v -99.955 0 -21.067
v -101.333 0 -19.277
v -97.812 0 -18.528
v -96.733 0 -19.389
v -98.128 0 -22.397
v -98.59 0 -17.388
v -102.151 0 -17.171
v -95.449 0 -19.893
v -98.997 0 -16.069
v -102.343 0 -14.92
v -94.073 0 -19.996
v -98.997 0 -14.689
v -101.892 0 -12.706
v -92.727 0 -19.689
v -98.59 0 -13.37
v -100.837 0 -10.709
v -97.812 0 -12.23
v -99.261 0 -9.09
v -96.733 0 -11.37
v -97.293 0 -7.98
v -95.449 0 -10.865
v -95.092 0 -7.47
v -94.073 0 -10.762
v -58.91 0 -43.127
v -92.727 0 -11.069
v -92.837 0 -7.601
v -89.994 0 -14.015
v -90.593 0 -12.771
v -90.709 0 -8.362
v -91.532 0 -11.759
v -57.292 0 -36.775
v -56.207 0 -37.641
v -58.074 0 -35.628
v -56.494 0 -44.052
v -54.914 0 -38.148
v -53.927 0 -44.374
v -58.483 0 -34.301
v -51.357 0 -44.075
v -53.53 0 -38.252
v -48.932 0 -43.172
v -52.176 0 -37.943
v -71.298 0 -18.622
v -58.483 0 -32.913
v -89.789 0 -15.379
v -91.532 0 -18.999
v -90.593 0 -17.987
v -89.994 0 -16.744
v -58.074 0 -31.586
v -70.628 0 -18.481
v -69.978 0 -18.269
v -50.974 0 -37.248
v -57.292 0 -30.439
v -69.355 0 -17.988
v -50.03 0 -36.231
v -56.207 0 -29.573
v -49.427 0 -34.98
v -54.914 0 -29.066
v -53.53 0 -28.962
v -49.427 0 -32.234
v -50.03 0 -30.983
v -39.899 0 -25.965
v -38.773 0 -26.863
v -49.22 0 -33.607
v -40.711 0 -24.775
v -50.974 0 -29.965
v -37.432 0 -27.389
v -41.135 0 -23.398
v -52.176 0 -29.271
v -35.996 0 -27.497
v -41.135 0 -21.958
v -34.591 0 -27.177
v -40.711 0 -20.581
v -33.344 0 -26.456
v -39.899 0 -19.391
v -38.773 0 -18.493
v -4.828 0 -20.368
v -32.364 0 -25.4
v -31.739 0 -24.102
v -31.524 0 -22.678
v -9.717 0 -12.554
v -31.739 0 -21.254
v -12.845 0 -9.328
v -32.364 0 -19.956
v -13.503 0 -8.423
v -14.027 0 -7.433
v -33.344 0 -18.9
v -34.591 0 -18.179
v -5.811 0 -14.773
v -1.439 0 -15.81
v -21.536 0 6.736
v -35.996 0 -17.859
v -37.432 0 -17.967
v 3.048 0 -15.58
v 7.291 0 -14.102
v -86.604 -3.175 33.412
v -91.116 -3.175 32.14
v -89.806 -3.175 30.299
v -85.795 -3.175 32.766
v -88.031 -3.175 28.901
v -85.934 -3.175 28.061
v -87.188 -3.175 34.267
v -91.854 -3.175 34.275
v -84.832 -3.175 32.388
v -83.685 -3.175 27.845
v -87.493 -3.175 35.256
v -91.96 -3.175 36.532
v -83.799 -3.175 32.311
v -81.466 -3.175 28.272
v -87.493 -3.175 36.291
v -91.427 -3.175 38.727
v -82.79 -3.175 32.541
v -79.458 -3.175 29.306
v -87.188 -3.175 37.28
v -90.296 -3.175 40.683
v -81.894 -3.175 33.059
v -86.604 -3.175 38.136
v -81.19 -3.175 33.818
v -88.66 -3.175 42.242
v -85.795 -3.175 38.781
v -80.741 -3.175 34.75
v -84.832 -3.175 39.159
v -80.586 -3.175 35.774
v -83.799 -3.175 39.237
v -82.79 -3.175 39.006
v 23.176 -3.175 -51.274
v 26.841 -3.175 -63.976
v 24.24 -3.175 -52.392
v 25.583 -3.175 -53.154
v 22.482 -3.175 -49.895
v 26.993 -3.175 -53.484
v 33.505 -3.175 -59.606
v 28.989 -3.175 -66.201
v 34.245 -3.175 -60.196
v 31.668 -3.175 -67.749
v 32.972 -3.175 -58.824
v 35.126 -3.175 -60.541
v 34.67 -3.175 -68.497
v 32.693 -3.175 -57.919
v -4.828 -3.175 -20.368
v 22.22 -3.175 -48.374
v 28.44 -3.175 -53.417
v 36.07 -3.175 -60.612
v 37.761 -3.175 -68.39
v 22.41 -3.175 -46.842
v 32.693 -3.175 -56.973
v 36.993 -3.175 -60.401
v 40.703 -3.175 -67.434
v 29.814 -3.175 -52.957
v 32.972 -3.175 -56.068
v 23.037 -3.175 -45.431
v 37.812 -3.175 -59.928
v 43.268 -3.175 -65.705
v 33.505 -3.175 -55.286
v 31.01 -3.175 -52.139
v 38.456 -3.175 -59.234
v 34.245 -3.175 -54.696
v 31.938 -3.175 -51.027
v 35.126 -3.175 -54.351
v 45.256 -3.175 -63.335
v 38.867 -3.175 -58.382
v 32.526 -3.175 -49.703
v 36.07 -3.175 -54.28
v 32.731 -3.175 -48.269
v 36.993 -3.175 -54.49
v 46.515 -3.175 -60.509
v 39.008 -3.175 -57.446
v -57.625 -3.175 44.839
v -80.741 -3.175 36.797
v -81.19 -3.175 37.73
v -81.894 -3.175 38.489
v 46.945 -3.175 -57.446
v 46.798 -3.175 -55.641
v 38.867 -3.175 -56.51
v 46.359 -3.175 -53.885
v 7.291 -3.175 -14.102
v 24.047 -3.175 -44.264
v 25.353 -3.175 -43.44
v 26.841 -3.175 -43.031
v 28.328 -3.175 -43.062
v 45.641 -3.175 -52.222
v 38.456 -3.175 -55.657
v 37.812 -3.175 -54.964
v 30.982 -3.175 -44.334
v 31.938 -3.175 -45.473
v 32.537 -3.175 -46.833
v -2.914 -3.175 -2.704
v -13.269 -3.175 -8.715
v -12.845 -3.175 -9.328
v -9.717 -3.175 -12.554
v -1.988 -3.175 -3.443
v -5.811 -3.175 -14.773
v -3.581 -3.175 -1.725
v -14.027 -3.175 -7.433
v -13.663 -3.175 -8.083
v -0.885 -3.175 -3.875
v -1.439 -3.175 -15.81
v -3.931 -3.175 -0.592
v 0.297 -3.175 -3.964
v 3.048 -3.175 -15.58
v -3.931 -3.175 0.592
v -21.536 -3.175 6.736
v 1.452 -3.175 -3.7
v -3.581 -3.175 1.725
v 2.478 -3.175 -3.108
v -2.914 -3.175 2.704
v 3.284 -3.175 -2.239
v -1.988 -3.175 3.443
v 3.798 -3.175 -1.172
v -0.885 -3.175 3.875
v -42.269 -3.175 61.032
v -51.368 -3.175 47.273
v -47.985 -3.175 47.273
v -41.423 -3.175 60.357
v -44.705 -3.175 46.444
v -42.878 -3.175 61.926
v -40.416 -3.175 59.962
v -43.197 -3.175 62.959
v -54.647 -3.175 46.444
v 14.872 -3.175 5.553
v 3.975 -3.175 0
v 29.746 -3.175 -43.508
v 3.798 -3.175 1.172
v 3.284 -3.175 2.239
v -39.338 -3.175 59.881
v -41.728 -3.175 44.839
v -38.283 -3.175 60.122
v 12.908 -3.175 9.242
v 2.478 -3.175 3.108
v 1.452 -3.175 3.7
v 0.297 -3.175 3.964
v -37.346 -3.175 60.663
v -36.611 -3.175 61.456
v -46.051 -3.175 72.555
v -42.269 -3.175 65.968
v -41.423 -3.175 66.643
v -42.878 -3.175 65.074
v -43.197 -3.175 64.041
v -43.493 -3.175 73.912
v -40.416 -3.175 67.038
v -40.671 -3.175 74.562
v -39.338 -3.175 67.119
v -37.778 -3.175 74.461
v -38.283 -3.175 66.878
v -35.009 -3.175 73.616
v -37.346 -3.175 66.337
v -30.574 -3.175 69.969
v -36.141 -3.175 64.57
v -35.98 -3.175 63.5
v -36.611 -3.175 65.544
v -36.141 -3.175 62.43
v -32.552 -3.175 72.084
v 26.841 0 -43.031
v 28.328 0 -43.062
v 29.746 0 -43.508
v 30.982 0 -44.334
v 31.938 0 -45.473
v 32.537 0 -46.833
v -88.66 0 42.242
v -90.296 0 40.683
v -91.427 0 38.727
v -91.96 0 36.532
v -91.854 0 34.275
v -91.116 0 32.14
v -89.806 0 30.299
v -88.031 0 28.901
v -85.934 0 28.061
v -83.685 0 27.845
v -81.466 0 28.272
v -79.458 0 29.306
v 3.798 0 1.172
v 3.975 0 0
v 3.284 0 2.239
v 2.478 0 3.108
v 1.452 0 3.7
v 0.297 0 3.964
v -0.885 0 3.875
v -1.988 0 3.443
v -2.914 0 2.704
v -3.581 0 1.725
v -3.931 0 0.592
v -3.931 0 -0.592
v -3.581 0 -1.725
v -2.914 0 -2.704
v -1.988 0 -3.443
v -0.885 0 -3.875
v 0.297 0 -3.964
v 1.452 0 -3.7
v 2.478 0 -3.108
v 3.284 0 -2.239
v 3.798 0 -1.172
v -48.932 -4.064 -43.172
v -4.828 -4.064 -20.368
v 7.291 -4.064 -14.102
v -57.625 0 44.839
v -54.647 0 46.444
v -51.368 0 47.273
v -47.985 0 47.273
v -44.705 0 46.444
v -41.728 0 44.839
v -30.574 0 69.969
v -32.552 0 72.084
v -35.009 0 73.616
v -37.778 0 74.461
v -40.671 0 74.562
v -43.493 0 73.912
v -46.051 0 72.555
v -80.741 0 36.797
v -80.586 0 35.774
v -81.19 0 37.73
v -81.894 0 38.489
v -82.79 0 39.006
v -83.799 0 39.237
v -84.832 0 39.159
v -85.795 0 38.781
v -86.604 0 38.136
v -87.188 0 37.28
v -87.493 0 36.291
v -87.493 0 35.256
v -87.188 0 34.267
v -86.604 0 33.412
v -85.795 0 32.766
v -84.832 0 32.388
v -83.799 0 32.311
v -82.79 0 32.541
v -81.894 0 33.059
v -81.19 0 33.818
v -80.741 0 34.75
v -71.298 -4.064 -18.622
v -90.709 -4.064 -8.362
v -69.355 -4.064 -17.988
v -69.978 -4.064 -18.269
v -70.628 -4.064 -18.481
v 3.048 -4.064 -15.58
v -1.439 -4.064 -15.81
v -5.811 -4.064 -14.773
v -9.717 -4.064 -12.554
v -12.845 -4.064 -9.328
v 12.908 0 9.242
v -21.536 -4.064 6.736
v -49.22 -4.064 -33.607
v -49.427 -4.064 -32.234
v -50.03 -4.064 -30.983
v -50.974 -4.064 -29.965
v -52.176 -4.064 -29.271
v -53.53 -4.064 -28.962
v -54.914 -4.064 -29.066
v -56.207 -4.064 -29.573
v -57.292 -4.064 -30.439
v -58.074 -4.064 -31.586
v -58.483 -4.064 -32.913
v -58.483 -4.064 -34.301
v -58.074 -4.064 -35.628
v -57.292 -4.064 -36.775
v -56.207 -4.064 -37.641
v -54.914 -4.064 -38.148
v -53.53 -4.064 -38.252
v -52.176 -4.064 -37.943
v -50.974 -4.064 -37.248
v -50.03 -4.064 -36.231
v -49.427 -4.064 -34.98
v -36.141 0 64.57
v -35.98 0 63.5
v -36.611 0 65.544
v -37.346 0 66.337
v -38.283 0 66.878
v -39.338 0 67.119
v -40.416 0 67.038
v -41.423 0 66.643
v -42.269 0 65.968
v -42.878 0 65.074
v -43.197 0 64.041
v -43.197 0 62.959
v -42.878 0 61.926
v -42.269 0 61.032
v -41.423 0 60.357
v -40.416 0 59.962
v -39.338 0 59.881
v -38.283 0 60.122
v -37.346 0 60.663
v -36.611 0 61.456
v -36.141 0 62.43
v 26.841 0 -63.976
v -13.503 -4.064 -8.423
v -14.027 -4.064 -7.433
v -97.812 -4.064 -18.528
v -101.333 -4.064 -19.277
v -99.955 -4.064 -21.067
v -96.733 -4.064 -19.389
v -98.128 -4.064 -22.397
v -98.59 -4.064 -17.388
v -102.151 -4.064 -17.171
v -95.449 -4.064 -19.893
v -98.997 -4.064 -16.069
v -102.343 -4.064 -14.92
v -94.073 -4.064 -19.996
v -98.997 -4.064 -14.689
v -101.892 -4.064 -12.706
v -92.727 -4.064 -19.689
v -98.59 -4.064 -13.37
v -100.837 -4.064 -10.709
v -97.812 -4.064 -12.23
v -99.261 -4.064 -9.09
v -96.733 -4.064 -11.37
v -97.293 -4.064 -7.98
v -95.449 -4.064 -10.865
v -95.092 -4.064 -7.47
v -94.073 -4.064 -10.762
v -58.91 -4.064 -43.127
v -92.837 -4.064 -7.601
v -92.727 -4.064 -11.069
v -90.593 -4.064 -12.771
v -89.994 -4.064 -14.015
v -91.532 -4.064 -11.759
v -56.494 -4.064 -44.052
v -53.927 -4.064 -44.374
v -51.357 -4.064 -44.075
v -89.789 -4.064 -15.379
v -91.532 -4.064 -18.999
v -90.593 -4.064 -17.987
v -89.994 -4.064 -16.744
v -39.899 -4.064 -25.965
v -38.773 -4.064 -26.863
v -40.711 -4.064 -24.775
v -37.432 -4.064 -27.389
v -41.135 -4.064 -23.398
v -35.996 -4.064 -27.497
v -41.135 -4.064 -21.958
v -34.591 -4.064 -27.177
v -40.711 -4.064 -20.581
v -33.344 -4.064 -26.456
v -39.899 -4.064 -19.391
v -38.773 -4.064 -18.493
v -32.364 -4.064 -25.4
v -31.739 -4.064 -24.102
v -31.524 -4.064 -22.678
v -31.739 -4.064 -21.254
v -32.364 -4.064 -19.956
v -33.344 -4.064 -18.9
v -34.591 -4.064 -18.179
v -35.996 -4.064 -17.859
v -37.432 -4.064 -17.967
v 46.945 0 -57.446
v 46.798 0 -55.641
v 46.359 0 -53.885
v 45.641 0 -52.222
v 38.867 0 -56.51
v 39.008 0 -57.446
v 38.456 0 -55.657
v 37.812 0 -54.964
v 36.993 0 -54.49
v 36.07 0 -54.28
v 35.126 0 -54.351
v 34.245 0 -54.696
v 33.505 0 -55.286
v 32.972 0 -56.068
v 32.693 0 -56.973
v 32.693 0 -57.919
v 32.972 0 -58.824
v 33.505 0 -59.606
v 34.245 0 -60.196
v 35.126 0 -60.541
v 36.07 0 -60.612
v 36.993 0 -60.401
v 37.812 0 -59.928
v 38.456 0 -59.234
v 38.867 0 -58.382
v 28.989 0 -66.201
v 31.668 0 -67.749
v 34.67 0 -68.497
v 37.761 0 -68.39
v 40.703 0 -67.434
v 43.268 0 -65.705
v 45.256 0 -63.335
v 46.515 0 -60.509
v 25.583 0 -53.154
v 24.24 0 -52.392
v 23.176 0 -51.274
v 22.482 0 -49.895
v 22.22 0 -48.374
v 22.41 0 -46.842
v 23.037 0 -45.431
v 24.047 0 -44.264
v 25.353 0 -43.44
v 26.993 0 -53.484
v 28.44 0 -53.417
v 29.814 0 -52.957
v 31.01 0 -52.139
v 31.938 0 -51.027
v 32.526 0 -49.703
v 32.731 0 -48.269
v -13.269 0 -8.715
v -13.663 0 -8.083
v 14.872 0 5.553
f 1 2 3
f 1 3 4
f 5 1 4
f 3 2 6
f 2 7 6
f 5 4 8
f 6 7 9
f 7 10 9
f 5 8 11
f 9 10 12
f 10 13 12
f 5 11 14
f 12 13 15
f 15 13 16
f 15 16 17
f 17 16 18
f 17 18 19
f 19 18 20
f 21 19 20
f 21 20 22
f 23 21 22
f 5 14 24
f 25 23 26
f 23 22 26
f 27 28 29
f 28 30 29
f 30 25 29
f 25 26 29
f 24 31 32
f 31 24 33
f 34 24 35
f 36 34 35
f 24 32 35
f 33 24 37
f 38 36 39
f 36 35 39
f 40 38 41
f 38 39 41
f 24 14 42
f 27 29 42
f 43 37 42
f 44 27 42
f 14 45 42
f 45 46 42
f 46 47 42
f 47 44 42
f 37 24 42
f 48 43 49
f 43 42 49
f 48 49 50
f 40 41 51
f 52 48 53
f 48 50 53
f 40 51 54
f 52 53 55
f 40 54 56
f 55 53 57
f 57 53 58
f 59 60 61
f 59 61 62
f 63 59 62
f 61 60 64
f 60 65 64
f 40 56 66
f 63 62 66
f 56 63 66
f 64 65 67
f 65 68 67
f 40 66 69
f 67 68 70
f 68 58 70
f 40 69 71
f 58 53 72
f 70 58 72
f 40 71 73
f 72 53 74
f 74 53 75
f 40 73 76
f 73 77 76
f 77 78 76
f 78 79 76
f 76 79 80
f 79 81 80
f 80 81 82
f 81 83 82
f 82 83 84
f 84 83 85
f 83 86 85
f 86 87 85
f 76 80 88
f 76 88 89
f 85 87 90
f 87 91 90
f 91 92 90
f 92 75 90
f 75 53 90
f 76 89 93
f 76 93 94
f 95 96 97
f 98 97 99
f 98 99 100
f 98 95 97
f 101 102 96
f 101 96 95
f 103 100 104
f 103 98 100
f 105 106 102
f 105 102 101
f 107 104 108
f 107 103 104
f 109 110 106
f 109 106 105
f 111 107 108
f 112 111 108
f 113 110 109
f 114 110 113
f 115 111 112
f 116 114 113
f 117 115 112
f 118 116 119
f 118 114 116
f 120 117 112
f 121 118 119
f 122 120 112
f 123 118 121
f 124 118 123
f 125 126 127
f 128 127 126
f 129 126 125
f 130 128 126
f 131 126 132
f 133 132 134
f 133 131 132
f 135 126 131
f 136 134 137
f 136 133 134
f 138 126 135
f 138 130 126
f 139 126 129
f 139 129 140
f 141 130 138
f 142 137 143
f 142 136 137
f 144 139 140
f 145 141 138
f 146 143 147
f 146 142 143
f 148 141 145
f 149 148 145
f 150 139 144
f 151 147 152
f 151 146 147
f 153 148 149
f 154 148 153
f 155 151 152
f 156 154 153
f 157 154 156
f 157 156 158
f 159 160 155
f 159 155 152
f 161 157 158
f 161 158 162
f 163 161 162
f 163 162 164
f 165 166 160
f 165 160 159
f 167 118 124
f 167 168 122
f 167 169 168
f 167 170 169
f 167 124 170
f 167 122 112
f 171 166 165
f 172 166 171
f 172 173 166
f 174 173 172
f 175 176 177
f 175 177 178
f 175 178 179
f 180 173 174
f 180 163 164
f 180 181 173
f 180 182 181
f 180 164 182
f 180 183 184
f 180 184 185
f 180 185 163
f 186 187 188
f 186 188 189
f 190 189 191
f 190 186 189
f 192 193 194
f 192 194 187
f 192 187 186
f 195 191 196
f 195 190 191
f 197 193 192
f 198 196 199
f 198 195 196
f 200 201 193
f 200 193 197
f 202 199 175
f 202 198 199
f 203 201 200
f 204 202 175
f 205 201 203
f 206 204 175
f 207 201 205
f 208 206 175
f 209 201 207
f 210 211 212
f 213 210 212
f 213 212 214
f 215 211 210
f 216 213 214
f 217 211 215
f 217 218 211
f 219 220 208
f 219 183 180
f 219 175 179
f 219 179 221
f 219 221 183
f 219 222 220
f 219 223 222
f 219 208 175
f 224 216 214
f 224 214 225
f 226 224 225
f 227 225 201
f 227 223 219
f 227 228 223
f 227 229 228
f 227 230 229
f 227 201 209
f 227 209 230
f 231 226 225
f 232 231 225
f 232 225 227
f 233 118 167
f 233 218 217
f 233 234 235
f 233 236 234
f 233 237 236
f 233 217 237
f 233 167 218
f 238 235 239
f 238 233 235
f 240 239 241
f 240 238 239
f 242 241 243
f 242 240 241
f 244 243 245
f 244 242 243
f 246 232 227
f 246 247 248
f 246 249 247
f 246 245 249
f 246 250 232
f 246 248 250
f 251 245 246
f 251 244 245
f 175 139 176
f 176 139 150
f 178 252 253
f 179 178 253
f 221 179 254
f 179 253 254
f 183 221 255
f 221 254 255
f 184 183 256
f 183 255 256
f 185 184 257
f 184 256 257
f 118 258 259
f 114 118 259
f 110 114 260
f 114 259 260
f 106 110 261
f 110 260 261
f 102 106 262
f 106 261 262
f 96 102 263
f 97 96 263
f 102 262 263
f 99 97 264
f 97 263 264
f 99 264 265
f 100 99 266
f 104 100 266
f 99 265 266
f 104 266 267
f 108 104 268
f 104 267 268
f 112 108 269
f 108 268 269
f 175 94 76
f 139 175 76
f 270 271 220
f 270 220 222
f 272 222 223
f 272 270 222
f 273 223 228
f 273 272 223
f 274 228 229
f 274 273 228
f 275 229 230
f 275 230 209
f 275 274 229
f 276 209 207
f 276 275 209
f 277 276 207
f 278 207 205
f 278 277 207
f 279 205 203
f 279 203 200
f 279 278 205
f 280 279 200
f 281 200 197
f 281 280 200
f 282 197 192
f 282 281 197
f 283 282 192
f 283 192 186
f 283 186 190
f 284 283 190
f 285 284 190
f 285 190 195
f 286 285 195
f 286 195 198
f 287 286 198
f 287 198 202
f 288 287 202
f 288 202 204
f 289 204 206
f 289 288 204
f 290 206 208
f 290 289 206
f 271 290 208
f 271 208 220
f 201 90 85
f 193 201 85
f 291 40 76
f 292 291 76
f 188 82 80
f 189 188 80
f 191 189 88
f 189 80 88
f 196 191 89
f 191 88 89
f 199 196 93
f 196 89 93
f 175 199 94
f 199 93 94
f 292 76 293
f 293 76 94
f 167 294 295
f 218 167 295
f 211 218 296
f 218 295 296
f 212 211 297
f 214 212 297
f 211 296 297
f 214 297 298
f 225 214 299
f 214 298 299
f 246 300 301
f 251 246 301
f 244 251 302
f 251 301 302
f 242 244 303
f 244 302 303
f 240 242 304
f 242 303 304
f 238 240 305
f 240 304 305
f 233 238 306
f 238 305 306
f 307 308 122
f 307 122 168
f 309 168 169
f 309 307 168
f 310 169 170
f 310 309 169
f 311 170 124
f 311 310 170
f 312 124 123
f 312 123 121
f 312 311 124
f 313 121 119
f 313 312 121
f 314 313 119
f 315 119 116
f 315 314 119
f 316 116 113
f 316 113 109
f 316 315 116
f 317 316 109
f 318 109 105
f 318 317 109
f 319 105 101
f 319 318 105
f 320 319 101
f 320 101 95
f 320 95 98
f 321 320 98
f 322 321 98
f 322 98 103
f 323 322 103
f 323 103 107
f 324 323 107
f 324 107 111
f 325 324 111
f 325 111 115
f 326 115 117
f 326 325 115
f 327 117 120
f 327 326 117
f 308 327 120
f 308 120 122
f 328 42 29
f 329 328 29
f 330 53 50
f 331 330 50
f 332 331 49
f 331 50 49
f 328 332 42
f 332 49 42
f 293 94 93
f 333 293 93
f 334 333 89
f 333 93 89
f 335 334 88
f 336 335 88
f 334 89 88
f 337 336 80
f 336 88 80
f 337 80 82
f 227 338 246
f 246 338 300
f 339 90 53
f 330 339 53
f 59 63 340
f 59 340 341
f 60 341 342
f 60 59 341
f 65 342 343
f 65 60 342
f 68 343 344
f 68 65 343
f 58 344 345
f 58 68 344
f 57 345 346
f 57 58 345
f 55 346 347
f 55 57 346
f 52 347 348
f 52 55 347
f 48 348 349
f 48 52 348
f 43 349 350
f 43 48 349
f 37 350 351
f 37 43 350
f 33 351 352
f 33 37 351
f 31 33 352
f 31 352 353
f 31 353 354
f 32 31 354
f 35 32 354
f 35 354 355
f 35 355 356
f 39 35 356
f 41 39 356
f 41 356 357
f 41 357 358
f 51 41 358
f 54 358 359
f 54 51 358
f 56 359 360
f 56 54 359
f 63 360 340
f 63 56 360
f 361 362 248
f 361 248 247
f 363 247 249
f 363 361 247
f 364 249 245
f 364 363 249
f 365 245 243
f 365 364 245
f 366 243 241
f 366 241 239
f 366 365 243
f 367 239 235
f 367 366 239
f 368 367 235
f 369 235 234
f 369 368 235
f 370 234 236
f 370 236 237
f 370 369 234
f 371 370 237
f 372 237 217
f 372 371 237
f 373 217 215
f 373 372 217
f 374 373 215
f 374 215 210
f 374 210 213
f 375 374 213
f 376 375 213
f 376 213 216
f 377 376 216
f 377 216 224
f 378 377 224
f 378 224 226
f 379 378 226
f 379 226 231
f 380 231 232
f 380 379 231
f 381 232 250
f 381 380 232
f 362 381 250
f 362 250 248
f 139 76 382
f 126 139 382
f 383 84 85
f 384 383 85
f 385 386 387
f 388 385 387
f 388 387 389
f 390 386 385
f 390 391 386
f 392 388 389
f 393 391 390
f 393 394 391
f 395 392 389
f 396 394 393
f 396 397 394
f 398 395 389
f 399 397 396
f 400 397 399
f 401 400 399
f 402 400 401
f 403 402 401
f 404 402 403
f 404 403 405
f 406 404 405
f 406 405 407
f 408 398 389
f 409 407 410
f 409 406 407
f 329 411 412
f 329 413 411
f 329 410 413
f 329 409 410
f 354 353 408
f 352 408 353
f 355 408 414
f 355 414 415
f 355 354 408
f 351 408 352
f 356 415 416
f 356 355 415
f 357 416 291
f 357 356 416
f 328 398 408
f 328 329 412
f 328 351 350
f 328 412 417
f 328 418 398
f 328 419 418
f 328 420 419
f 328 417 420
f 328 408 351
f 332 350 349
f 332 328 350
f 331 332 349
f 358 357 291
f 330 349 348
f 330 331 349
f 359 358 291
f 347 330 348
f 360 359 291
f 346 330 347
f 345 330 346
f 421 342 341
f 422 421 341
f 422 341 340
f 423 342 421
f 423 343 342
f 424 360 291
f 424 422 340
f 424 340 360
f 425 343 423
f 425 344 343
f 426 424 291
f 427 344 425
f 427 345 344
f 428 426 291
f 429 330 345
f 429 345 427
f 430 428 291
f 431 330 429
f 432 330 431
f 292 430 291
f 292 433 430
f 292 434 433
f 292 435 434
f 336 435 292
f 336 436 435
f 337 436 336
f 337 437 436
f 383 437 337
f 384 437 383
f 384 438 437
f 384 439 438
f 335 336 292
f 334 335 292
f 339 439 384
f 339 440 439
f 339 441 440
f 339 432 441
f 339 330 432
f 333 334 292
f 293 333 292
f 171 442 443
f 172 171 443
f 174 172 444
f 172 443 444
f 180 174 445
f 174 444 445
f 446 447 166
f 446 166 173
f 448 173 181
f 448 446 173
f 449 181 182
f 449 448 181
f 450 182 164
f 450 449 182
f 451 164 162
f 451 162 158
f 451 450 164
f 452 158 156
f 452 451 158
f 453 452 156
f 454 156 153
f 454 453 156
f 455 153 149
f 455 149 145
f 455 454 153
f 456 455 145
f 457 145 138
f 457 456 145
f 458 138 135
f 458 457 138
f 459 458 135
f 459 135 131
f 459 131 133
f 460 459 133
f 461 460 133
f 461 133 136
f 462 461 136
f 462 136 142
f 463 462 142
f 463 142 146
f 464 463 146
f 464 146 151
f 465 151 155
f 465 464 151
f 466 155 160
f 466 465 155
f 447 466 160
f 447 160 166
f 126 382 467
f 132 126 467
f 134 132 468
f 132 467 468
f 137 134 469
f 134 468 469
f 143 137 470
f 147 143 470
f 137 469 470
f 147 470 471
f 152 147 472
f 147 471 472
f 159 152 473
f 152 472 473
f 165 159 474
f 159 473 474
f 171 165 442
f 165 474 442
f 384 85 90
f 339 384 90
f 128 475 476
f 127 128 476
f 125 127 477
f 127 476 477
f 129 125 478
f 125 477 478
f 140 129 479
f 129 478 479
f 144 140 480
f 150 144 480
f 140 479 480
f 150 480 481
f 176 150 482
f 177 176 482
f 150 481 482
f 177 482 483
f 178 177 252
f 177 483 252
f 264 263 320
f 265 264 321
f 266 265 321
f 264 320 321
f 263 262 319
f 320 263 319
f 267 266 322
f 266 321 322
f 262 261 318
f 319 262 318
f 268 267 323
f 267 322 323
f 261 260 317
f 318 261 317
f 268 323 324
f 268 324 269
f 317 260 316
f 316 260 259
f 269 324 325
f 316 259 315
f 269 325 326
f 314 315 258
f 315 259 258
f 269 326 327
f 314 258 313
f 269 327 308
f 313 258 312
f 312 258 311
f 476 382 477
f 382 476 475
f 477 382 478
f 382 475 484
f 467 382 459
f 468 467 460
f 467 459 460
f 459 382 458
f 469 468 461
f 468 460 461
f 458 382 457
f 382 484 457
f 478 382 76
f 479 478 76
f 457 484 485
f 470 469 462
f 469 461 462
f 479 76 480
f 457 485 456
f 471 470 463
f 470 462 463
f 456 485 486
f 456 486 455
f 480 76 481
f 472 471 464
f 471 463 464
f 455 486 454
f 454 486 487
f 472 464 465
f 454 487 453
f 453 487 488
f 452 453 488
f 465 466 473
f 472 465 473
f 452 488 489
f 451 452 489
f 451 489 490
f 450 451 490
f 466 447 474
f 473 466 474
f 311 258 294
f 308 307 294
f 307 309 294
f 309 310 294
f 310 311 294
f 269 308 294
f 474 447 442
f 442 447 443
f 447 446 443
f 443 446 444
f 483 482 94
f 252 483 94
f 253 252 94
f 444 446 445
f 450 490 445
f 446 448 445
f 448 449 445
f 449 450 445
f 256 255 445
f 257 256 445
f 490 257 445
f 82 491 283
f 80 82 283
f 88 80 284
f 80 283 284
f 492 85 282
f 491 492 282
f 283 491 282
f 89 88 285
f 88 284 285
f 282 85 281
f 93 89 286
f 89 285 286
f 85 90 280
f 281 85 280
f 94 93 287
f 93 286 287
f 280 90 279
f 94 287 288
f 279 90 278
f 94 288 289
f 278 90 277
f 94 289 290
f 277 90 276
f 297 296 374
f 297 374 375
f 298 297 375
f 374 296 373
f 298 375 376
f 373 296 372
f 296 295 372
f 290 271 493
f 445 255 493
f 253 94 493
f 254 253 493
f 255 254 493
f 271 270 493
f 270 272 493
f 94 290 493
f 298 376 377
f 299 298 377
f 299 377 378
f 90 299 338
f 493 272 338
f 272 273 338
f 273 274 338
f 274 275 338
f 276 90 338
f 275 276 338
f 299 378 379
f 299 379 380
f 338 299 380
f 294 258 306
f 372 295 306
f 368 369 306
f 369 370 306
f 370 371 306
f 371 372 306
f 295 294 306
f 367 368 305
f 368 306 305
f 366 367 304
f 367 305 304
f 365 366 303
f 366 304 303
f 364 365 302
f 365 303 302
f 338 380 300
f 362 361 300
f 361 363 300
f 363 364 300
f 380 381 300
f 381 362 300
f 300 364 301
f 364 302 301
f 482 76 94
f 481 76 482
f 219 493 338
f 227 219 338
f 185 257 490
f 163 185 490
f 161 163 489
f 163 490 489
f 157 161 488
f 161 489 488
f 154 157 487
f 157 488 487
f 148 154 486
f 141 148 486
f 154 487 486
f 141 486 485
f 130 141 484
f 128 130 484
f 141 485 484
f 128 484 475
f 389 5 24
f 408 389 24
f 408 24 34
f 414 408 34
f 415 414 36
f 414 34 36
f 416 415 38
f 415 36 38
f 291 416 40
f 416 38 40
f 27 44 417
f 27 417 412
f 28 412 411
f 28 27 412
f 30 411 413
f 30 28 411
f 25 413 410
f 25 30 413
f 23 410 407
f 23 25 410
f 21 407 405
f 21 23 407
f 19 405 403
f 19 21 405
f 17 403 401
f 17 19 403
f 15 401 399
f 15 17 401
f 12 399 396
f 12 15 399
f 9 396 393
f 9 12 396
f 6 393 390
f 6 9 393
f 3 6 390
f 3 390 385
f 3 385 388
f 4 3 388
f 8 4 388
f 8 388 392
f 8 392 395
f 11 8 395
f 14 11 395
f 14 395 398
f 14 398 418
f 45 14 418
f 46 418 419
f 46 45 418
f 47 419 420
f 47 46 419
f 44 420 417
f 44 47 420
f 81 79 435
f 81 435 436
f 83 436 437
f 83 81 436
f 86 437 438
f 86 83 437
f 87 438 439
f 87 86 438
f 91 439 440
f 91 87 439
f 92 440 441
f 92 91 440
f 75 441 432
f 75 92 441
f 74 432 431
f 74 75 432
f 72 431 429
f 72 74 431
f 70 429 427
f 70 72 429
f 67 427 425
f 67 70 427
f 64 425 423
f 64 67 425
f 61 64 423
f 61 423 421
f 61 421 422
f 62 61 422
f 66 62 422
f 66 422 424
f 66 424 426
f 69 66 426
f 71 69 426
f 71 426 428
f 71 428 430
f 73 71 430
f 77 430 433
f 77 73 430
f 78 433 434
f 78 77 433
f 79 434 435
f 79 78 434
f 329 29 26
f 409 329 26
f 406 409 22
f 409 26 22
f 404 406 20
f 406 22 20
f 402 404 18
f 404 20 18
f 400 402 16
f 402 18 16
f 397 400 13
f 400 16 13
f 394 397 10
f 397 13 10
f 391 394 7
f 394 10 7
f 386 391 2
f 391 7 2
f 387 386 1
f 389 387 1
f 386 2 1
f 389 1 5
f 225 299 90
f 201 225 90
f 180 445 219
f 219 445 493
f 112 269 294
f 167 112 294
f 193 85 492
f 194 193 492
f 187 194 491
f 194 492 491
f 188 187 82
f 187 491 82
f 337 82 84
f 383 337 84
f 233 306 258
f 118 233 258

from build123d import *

# Parameters (mm, degrees)
F0_R     = 3.9751
F0_R_2   = 3.628816
F0_R_3   = 3.472518
F0_R_4   = 3.175
F1_DEPTH = 3.175
F0_R_5   = 4.832637
F0_R_6   = 4.629733
F0_R_7   = 4.657638
F2_DEPTH = 4.064


with BuildPart() as f1:
    # F0 (on Front) → F1 (new body)
    with BuildSketch(Plane.XZ):
        with BuildLine():
            Line((-21.536162, 6.73628), (-14.027085, -7.433472))
            ThreePointArc((-14.027085, -7.433472), (-8.356432, 13.497617), (12.907511, 9.241849))
            Line((12.907511, 9.241849), (-30.573676, 69.969295))
            ThreePointArc((-30.573676, 69.969295), (-29.028481, 66.897304), (-28.496434, 63.5))
            ThreePointArc((-28.496434, 63.5), (-44.703185, 53.623955), (-46.050767, 72.554858))
            Line((-46.050767, 72.554858), (-88.660243, 42.241502))
            ThreePointArc((-88.660243, 42.241502), (-80.420183, 42.828064), (-76.121434, 35.773746))
            ThreePointArc((-76.121434, 35.773746), (-77.004616, 32.134995), (-79.457625, 29.305991))
            Line((-79.457625, 29.305991), (-57.624544, 44.838544))
            ThreePointArc((-57.624544, 44.838544), (-49.676253, 47.377377), (-41.727963, 44.838544))
            Line((-41.727963, 44.838544), (-21.536162, 6.73628))
        make_face()
        with BuildLine():
            ThreePointArc((15.875, 0), (13.560284, -8.254351), (7.29115, -14.101587))
            Line((7.29115, -14.101587), (-4.828069, -20.367764))
            Line((-4.828069, -20.367764), (26.841076, -63.975835))
            ThreePointArc((26.841076, -63.975835), (24.794526, -58.729524), (25.582612, -53.153588))
            ThreePointArc((25.582612, -53.153588), (22.258247, -47.600731), (26.841076, -43.030907))
            ThreePointArc((26.841076, -43.030907), (30.393334, -43.877214), (32.537179, -46.833344))
            ThreePointArc((32.537179, -46.833344), (40.05933, -47.168661), (45.640942, -52.222451))
            Line((45.640942, -52.222451), (14.872281, 5.552558))
            ThreePointArc((14.872281, 5.552558), (15.622309, 2.821185), (15.875, 0))
        make_face()
        with BuildLine():
            ThreePointArc((-12.845102, -9.328397), (-3.661616, -15.446948), (7.29115, -14.101587))
            ThreePointArc((7.29115, -14.101587), (13.560284, -8.254351), (15.875, 0))
            ThreePointArc((15.875, 0), (15.622309, 2.821185), (14.872281, 5.552558))
            Line((14.872281, 5.552558), (12.907511, 9.241849))
            ThreePointArc((12.907511, 9.241849), (-8.356432, 13.497617), (-14.027085, -7.433472))
            ThreePointArc((-14.027085, -7.433472), (-13.469458, -8.401746), (-12.845102, -9.328397))
        make_face()
        Circle(F0_R, mode=Mode.SUBTRACT)
        with BuildLine():
            ThreePointArc((-28.496434, 63.5), (-29.028481, 66.897304), (-30.573676, 69.969295))
            ThreePointArc((-30.573676, 69.969295), (-37.777883, 74.460607), (-46.050767, 72.554858))
            ThreePointArc((-46.050767, 72.554858), (-44.703185, 53.623955), (-28.496434, 63.5))
        make_face()
        with Locations((-39.608934, 63.5)):
            Circle(F0_R_2, mode=Mode.SUBTRACT)
        with BuildLine():
            ThreePointArc((-76.121434, 35.773746), (-80.420183, 42.828064), (-88.660243, 42.241502))
            ThreePointArc((-88.660243, 42.241502), (-90.526689, 31.172437), (-79.457625, 29.305991))
            ThreePointArc((-79.457625, 29.305991), (-77.004616, 32.134995), (-76.121434, 35.773746))
        make_face()
        with Locations((-84.058934, 35.773746)):
            Circle(F0_R_3, mode=Mode.SUBTRACT)
        with BuildLine():
            ThreePointArc((25.582612, -53.153588), (24.794526, -58.729524), (26.841076, -63.975835))
            ThreePointArc((26.841076, -63.975835), (39.26549, -68.014932), (46.945147, -57.445957))
            ThreePointArc((46.945147, -57.445957), (46.614167, -54.754026), (45.640942, -52.222451))
            ThreePointArc((45.640942, -52.222451), (40.05933, -47.168661), (32.537179, -46.833344))
            ThreePointArc((32.537179, -46.833344), (31.010164, -52.13947), (25.582612, -53.153588))
        make_face()
        with Locations((35.832647, -57.445957)):
            Circle(F0_R_4, mode=Mode.SUBTRACT)
    extrude(amount=F1_DEPTH)


with BuildPart() as f2:
    # F0 (on Front) → F2 (new body)
    with BuildSketch(Plane.XZ):
        with BuildLine():
            Line((-4.828069, -20.367764), (7.29115, -14.101587))
            ThreePointArc((7.29115, -14.101587), (-3.661616, -15.446948), (-12.845102, -9.328397))
            Line((-12.845102, -9.328397), (-4.828069, -20.367764))
        make_face()
        with BuildLine():
            Line((-4.828069, -20.367764), (-12.845102, -9.328397))
            Line((-12.845102, -9.328397), (-13.502905, -8.422609))
            Line((-13.502905, -8.422609), (-14.027085, -7.433472))
            Line((-14.027085, -7.433472), (-21.536162, 6.73628))
            Line((-21.536162, 6.73628), (-69.354503, -17.987935))
            ThreePointArc((-69.354503, -17.987935), (-70.300348, -18.383787), (-71.297571, -18.622251))
            Line((-71.297571, -18.622251), (-90.709241, -8.361662))
            ThreePointArc((-90.709241, -8.361662), (-87.619767, -11.282719), (-86.481032, -15.379145))
            ThreePointArc((-86.481032, -15.379145), (-90.322105, -22.17791), (-98.127822, -22.396629))
            Line((-98.127822, -22.396629), (-58.909646, -43.126509))
            ThreePointArc((-58.909646, -43.126509), (-59.434814, -24.38416), (-43.110263, -33.606983))
            ThreePointArc((-43.110263, -33.606983), (-44.680269, -39.205679), (-48.932448, -43.171695))
            Line((-48.932448, -43.171695), (-4.828069, -20.367764))
        make_face()
        with Locations((-36.35676, -22.677992)):
            Circle(F0_R_5, mode=Mode.SUBTRACT)
        with BuildLine():
            ThreePointArc((-90.709241, -8.361662), (-101.436015, -11.669855), (-98.127822, -22.396629))
            ThreePointArc((-98.127822, -22.396629), (-90.322105, -22.17791), (-86.481032, -15.379145))
            ThreePointArc((-86.481032, -15.379145), (-87.619767, -11.282719), (-90.709241, -8.361662))
        make_face()
        with Locations((-94.418532, -15.379145)):
            Circle(F0_R_6, mode=Mode.SUBTRACT)
        with BuildLine():
            ThreePointArc((-58.909646, -43.126509), (-53.926597, -44.374441), (-48.932448, -43.171695))
            ThreePointArc((-48.932448, -43.171695), (-44.680269, -39.205679), (-43.110263, -33.606983))
            ThreePointArc((-43.110263, -33.606983), (-59.434814, -24.38416), (-58.909646, -43.126509))
        make_face()
        with Locations((-53.877831, -33.606983)):
            Circle(F0_R_7, mode=Mode.SUBTRACT)
    extrude(amount=F2_DEPTH)


solid = Compound([f1.part, f2.part])
